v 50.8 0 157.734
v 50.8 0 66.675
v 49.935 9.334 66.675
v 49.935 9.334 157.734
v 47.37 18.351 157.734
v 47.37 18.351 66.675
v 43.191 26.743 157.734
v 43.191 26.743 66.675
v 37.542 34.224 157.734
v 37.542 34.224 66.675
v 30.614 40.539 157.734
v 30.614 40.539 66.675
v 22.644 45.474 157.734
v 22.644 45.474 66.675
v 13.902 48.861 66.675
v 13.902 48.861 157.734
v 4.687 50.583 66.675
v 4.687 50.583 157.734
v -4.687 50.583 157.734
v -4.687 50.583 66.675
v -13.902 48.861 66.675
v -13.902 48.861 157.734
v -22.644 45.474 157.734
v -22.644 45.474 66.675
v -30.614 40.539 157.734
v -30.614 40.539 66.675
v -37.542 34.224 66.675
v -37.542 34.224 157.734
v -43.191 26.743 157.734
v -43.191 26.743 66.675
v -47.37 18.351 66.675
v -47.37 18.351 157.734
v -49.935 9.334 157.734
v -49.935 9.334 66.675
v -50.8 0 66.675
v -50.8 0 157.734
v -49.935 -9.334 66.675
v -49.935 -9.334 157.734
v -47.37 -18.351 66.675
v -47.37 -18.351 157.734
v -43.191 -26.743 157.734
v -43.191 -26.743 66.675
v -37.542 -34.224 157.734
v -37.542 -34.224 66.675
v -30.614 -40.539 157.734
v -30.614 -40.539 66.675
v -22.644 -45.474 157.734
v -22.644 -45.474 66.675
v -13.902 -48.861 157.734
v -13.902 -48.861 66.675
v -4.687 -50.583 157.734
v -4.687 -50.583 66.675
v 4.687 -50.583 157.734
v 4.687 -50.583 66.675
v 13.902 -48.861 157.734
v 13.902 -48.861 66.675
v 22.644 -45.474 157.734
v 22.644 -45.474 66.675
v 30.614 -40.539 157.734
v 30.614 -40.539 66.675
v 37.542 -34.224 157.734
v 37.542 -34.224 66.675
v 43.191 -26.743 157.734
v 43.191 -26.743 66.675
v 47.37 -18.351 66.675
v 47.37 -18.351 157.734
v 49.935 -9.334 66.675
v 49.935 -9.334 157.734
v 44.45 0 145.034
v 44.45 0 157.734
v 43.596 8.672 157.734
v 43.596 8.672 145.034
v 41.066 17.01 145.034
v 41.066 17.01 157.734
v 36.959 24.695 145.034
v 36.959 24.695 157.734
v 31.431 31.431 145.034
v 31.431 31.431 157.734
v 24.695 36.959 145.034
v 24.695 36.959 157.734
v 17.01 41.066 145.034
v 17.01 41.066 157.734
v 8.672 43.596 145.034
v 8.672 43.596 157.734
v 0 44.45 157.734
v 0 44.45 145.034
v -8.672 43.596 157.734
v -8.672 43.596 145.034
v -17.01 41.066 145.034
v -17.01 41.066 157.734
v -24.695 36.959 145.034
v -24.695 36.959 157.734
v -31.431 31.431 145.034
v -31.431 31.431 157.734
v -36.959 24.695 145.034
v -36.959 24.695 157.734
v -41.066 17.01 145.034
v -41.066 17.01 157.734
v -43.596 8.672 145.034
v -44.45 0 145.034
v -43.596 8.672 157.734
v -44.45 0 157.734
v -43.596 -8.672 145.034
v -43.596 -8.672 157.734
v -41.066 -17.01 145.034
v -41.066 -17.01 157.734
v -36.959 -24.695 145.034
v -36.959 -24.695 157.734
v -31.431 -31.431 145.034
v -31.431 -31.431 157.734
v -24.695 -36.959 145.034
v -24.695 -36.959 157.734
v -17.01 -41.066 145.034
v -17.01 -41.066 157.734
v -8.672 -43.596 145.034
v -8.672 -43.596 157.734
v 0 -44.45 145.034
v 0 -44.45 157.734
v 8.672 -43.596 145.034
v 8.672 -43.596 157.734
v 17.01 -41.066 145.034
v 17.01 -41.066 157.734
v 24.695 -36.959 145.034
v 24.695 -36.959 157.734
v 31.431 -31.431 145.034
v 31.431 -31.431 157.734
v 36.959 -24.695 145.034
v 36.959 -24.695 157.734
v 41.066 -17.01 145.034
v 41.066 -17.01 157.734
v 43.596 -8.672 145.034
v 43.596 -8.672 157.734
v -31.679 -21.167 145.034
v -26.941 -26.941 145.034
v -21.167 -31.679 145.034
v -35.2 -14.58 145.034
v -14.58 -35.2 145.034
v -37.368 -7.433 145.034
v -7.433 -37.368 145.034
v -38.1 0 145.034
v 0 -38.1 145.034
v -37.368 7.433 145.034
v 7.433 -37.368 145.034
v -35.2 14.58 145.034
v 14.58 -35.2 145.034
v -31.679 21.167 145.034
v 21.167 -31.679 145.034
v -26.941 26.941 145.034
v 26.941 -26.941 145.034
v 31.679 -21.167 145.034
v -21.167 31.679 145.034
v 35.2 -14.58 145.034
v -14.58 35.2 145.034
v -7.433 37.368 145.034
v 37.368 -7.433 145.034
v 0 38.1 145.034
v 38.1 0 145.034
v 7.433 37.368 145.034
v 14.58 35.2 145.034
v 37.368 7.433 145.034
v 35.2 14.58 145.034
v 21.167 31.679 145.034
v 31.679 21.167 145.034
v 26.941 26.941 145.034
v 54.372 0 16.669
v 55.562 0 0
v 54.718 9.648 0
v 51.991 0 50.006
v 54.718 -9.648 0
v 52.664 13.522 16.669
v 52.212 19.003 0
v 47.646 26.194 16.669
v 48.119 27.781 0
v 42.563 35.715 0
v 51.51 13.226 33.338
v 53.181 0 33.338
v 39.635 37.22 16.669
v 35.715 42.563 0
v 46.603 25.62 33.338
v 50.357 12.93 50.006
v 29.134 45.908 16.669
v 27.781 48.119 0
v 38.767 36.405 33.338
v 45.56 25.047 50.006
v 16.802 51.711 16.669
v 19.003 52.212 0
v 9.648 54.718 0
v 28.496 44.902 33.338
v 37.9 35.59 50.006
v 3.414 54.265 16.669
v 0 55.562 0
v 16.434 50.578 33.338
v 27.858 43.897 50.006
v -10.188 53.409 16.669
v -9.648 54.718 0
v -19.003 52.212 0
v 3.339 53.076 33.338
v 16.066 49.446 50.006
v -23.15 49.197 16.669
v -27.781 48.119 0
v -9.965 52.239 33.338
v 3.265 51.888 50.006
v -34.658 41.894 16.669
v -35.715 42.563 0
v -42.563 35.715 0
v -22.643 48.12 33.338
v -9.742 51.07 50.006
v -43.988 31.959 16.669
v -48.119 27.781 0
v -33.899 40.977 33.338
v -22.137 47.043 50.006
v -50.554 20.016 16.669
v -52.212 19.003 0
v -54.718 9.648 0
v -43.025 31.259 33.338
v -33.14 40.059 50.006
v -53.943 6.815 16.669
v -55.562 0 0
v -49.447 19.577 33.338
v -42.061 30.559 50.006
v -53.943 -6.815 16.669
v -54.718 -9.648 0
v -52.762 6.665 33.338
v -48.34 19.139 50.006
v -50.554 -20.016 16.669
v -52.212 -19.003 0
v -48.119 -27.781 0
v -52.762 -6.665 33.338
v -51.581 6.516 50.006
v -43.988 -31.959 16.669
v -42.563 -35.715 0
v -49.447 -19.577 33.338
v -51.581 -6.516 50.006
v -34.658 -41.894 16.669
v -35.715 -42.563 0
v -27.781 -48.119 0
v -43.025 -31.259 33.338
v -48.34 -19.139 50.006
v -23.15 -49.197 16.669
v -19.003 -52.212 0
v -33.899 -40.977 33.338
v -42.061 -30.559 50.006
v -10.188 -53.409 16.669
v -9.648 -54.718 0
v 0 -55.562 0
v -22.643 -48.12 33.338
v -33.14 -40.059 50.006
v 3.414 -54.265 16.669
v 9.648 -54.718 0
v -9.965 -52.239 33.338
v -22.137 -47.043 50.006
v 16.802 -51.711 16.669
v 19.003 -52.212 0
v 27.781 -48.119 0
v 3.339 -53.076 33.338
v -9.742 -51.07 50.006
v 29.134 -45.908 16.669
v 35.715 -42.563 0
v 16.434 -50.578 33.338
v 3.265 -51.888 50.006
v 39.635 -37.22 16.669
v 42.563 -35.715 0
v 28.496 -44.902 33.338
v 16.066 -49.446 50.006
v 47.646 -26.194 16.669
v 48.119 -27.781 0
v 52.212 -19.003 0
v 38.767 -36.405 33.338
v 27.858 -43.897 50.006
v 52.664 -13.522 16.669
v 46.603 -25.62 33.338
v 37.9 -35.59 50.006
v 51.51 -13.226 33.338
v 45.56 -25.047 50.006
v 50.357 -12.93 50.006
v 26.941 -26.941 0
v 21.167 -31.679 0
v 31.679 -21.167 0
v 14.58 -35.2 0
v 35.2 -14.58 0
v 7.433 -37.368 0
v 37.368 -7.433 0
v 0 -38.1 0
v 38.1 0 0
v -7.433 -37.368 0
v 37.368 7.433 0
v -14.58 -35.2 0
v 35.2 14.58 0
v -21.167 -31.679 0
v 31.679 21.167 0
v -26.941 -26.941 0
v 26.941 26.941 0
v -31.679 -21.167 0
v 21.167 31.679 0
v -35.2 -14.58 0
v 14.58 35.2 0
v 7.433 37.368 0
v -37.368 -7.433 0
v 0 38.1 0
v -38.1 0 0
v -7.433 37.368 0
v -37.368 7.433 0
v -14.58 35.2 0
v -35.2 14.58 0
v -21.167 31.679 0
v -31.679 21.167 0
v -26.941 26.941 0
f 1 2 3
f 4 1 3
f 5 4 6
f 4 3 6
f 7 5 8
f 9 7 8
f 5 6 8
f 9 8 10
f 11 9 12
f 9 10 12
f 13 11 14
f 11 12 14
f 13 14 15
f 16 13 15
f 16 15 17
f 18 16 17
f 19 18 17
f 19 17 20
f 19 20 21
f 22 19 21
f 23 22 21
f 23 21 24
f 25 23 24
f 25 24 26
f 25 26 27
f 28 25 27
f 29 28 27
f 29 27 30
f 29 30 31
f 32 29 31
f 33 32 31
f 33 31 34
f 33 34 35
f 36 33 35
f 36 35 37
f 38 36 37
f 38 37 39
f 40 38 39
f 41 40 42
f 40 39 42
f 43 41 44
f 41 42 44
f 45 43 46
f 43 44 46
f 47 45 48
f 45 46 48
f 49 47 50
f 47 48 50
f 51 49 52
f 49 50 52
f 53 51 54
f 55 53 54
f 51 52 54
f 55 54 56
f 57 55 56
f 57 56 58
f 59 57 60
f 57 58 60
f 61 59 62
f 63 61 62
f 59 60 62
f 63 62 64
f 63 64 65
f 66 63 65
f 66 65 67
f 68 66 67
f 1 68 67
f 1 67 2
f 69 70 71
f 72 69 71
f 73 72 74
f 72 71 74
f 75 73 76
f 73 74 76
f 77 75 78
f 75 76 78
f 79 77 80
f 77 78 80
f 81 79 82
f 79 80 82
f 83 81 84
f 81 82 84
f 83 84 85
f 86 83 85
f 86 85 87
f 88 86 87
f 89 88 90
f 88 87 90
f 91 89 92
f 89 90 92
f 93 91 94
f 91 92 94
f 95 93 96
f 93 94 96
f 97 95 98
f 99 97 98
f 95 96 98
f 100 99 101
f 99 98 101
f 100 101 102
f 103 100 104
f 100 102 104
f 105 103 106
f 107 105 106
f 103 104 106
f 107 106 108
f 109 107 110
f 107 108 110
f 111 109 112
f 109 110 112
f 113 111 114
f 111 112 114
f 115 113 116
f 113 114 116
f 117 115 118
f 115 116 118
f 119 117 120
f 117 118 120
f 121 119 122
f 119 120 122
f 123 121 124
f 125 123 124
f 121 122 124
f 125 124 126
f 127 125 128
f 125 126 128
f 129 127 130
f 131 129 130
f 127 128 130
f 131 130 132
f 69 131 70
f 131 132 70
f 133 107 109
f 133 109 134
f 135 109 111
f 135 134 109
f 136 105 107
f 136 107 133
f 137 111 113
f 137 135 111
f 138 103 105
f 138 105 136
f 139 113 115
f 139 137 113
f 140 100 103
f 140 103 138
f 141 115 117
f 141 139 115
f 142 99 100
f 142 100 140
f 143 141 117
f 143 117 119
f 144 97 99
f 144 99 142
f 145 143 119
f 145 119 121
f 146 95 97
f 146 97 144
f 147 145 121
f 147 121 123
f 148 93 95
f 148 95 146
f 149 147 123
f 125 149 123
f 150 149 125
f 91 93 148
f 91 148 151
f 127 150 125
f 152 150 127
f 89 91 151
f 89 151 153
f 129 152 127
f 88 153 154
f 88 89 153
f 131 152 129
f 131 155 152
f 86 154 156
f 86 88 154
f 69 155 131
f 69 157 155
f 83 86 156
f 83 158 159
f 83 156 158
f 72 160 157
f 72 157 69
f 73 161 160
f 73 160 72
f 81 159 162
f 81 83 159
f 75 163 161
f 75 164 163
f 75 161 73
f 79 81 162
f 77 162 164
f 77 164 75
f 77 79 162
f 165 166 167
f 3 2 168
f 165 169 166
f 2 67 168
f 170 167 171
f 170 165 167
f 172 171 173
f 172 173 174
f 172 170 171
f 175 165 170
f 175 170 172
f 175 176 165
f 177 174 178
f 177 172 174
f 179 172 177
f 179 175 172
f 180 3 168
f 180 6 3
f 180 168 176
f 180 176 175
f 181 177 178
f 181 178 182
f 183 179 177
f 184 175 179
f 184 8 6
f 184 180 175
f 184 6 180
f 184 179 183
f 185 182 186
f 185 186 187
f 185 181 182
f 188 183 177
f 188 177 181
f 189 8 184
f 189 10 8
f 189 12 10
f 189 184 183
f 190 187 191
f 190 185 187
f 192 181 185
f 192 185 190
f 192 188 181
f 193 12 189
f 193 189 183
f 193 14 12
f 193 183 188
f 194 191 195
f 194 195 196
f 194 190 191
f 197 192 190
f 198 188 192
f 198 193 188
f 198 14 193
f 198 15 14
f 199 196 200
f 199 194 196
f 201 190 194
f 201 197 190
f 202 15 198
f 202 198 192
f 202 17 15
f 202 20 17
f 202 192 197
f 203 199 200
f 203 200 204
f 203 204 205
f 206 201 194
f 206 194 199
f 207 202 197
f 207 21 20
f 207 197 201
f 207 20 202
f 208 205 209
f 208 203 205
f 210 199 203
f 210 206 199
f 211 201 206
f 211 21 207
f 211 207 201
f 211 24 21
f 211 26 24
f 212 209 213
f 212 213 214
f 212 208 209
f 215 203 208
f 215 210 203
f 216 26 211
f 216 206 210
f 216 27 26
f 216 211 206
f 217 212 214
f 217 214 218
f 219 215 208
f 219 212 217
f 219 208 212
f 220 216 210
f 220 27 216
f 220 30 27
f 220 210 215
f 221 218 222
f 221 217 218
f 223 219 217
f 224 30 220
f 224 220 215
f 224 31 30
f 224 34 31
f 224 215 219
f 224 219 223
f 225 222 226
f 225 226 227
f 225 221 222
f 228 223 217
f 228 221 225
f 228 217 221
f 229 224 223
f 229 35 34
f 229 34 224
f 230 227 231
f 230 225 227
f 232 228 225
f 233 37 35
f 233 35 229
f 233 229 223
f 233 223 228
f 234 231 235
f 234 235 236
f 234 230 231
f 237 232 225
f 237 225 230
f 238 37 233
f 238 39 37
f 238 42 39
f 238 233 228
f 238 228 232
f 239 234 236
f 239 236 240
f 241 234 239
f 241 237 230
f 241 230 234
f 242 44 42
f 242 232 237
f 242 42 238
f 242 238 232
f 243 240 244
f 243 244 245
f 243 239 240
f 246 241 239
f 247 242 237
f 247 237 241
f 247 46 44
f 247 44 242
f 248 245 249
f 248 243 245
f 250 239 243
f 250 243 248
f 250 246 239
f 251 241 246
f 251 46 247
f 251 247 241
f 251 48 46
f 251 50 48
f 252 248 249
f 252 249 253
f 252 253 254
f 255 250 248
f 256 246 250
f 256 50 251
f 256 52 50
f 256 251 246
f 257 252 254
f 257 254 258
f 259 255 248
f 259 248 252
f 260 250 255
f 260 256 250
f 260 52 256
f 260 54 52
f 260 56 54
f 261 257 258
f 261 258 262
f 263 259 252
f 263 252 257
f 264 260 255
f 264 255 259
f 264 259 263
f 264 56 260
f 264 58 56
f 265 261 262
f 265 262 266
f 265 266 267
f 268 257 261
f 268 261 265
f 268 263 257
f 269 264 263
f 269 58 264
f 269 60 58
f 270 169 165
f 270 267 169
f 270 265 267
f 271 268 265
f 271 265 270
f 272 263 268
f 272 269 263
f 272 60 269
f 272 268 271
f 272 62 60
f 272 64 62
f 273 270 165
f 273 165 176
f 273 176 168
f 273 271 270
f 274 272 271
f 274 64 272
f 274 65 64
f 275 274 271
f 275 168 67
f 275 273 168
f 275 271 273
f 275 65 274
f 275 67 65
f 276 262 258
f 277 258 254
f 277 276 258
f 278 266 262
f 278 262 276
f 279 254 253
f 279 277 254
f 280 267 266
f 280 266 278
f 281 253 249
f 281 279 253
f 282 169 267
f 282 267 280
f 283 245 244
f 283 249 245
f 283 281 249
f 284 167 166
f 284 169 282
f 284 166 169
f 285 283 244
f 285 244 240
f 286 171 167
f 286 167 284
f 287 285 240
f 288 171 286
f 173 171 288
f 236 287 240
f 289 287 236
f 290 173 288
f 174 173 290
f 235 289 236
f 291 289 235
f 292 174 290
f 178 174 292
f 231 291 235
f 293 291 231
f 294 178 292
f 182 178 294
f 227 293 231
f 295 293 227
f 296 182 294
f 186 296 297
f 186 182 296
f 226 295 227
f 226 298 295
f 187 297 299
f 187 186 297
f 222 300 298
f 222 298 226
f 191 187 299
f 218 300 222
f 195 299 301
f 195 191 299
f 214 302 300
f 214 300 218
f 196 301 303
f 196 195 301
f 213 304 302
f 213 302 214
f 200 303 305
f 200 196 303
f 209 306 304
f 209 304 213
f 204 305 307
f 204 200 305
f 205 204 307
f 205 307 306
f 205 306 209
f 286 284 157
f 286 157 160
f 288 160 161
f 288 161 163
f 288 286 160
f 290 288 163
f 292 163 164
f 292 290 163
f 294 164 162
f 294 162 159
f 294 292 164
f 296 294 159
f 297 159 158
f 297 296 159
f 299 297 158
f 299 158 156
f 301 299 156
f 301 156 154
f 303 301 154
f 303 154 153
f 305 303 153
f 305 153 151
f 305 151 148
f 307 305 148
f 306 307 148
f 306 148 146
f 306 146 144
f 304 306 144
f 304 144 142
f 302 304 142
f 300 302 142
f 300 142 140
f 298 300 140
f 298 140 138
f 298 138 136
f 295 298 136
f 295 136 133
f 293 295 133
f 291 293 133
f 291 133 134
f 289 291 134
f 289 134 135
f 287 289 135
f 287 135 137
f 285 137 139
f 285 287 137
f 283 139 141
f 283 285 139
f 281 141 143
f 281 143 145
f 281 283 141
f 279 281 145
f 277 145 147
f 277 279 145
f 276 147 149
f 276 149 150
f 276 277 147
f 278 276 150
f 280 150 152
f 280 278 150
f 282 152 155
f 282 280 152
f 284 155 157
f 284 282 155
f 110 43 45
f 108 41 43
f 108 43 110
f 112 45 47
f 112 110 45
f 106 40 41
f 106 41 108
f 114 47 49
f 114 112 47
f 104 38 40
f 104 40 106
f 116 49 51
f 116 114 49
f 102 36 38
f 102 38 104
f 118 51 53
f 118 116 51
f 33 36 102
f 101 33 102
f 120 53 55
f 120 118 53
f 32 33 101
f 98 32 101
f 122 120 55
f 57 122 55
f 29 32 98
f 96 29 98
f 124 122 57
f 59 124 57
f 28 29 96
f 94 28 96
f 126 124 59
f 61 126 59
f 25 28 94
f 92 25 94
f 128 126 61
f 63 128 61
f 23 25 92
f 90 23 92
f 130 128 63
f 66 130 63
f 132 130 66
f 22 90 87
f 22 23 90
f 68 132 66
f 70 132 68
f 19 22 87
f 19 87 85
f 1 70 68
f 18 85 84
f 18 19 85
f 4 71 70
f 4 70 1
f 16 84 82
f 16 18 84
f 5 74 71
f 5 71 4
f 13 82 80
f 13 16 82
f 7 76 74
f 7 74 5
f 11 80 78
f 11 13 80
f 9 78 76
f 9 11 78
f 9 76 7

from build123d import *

# Parameters (mm, degrees)
SKETCH1_R           = 50.8
SKETCH1_R_2         = 38.1
BOSS_EXTRUDE1_DEPTH = 157.734
SKETCH2_R           = 38.1
SKETCH2_R_2         = 44.45
CUT_EXTRUDE1_DEPTH  = 12.7


with BuildPart() as part:
    # Sketch1 → Boss-Extrude1 (new body)
    with BuildSketch(Plane.XY):
        Circle(SKETCH1_R)
        Circle(SKETCH1_R_2, mode=Mode.SUBTRACT)
    extrude(amount=BOSS_EXTRUDE1_DEPTH)

    # Sketch2 → Cut-Extrude1 (cut)
    with BuildSketch(Plane.XY.offset(157.734)):
        Circle(SKETCH2_R)
        Circle(SKETCH2_R_2)
        Circle(SKETCH2_R, mode=Mode.SUBTRACT)
    extrude(amount=-CUT_EXTRUDE1_DEPTH, mode=Mode.SUBTRACT)

    # Sketch3 → Revolve1 (revolve)
    with BuildSketch(Plane(origin=(0, 0, 0), x_dir=(1, 0, 0), z_dir=(0, 1, 0))):
        Polygon((55.5625, 0), (50.8, -66.675), (50.8, 0), align=None)
    revolve(axis=Axis((0, 0, 0), (0, 0, 1)))


solid = part.part
